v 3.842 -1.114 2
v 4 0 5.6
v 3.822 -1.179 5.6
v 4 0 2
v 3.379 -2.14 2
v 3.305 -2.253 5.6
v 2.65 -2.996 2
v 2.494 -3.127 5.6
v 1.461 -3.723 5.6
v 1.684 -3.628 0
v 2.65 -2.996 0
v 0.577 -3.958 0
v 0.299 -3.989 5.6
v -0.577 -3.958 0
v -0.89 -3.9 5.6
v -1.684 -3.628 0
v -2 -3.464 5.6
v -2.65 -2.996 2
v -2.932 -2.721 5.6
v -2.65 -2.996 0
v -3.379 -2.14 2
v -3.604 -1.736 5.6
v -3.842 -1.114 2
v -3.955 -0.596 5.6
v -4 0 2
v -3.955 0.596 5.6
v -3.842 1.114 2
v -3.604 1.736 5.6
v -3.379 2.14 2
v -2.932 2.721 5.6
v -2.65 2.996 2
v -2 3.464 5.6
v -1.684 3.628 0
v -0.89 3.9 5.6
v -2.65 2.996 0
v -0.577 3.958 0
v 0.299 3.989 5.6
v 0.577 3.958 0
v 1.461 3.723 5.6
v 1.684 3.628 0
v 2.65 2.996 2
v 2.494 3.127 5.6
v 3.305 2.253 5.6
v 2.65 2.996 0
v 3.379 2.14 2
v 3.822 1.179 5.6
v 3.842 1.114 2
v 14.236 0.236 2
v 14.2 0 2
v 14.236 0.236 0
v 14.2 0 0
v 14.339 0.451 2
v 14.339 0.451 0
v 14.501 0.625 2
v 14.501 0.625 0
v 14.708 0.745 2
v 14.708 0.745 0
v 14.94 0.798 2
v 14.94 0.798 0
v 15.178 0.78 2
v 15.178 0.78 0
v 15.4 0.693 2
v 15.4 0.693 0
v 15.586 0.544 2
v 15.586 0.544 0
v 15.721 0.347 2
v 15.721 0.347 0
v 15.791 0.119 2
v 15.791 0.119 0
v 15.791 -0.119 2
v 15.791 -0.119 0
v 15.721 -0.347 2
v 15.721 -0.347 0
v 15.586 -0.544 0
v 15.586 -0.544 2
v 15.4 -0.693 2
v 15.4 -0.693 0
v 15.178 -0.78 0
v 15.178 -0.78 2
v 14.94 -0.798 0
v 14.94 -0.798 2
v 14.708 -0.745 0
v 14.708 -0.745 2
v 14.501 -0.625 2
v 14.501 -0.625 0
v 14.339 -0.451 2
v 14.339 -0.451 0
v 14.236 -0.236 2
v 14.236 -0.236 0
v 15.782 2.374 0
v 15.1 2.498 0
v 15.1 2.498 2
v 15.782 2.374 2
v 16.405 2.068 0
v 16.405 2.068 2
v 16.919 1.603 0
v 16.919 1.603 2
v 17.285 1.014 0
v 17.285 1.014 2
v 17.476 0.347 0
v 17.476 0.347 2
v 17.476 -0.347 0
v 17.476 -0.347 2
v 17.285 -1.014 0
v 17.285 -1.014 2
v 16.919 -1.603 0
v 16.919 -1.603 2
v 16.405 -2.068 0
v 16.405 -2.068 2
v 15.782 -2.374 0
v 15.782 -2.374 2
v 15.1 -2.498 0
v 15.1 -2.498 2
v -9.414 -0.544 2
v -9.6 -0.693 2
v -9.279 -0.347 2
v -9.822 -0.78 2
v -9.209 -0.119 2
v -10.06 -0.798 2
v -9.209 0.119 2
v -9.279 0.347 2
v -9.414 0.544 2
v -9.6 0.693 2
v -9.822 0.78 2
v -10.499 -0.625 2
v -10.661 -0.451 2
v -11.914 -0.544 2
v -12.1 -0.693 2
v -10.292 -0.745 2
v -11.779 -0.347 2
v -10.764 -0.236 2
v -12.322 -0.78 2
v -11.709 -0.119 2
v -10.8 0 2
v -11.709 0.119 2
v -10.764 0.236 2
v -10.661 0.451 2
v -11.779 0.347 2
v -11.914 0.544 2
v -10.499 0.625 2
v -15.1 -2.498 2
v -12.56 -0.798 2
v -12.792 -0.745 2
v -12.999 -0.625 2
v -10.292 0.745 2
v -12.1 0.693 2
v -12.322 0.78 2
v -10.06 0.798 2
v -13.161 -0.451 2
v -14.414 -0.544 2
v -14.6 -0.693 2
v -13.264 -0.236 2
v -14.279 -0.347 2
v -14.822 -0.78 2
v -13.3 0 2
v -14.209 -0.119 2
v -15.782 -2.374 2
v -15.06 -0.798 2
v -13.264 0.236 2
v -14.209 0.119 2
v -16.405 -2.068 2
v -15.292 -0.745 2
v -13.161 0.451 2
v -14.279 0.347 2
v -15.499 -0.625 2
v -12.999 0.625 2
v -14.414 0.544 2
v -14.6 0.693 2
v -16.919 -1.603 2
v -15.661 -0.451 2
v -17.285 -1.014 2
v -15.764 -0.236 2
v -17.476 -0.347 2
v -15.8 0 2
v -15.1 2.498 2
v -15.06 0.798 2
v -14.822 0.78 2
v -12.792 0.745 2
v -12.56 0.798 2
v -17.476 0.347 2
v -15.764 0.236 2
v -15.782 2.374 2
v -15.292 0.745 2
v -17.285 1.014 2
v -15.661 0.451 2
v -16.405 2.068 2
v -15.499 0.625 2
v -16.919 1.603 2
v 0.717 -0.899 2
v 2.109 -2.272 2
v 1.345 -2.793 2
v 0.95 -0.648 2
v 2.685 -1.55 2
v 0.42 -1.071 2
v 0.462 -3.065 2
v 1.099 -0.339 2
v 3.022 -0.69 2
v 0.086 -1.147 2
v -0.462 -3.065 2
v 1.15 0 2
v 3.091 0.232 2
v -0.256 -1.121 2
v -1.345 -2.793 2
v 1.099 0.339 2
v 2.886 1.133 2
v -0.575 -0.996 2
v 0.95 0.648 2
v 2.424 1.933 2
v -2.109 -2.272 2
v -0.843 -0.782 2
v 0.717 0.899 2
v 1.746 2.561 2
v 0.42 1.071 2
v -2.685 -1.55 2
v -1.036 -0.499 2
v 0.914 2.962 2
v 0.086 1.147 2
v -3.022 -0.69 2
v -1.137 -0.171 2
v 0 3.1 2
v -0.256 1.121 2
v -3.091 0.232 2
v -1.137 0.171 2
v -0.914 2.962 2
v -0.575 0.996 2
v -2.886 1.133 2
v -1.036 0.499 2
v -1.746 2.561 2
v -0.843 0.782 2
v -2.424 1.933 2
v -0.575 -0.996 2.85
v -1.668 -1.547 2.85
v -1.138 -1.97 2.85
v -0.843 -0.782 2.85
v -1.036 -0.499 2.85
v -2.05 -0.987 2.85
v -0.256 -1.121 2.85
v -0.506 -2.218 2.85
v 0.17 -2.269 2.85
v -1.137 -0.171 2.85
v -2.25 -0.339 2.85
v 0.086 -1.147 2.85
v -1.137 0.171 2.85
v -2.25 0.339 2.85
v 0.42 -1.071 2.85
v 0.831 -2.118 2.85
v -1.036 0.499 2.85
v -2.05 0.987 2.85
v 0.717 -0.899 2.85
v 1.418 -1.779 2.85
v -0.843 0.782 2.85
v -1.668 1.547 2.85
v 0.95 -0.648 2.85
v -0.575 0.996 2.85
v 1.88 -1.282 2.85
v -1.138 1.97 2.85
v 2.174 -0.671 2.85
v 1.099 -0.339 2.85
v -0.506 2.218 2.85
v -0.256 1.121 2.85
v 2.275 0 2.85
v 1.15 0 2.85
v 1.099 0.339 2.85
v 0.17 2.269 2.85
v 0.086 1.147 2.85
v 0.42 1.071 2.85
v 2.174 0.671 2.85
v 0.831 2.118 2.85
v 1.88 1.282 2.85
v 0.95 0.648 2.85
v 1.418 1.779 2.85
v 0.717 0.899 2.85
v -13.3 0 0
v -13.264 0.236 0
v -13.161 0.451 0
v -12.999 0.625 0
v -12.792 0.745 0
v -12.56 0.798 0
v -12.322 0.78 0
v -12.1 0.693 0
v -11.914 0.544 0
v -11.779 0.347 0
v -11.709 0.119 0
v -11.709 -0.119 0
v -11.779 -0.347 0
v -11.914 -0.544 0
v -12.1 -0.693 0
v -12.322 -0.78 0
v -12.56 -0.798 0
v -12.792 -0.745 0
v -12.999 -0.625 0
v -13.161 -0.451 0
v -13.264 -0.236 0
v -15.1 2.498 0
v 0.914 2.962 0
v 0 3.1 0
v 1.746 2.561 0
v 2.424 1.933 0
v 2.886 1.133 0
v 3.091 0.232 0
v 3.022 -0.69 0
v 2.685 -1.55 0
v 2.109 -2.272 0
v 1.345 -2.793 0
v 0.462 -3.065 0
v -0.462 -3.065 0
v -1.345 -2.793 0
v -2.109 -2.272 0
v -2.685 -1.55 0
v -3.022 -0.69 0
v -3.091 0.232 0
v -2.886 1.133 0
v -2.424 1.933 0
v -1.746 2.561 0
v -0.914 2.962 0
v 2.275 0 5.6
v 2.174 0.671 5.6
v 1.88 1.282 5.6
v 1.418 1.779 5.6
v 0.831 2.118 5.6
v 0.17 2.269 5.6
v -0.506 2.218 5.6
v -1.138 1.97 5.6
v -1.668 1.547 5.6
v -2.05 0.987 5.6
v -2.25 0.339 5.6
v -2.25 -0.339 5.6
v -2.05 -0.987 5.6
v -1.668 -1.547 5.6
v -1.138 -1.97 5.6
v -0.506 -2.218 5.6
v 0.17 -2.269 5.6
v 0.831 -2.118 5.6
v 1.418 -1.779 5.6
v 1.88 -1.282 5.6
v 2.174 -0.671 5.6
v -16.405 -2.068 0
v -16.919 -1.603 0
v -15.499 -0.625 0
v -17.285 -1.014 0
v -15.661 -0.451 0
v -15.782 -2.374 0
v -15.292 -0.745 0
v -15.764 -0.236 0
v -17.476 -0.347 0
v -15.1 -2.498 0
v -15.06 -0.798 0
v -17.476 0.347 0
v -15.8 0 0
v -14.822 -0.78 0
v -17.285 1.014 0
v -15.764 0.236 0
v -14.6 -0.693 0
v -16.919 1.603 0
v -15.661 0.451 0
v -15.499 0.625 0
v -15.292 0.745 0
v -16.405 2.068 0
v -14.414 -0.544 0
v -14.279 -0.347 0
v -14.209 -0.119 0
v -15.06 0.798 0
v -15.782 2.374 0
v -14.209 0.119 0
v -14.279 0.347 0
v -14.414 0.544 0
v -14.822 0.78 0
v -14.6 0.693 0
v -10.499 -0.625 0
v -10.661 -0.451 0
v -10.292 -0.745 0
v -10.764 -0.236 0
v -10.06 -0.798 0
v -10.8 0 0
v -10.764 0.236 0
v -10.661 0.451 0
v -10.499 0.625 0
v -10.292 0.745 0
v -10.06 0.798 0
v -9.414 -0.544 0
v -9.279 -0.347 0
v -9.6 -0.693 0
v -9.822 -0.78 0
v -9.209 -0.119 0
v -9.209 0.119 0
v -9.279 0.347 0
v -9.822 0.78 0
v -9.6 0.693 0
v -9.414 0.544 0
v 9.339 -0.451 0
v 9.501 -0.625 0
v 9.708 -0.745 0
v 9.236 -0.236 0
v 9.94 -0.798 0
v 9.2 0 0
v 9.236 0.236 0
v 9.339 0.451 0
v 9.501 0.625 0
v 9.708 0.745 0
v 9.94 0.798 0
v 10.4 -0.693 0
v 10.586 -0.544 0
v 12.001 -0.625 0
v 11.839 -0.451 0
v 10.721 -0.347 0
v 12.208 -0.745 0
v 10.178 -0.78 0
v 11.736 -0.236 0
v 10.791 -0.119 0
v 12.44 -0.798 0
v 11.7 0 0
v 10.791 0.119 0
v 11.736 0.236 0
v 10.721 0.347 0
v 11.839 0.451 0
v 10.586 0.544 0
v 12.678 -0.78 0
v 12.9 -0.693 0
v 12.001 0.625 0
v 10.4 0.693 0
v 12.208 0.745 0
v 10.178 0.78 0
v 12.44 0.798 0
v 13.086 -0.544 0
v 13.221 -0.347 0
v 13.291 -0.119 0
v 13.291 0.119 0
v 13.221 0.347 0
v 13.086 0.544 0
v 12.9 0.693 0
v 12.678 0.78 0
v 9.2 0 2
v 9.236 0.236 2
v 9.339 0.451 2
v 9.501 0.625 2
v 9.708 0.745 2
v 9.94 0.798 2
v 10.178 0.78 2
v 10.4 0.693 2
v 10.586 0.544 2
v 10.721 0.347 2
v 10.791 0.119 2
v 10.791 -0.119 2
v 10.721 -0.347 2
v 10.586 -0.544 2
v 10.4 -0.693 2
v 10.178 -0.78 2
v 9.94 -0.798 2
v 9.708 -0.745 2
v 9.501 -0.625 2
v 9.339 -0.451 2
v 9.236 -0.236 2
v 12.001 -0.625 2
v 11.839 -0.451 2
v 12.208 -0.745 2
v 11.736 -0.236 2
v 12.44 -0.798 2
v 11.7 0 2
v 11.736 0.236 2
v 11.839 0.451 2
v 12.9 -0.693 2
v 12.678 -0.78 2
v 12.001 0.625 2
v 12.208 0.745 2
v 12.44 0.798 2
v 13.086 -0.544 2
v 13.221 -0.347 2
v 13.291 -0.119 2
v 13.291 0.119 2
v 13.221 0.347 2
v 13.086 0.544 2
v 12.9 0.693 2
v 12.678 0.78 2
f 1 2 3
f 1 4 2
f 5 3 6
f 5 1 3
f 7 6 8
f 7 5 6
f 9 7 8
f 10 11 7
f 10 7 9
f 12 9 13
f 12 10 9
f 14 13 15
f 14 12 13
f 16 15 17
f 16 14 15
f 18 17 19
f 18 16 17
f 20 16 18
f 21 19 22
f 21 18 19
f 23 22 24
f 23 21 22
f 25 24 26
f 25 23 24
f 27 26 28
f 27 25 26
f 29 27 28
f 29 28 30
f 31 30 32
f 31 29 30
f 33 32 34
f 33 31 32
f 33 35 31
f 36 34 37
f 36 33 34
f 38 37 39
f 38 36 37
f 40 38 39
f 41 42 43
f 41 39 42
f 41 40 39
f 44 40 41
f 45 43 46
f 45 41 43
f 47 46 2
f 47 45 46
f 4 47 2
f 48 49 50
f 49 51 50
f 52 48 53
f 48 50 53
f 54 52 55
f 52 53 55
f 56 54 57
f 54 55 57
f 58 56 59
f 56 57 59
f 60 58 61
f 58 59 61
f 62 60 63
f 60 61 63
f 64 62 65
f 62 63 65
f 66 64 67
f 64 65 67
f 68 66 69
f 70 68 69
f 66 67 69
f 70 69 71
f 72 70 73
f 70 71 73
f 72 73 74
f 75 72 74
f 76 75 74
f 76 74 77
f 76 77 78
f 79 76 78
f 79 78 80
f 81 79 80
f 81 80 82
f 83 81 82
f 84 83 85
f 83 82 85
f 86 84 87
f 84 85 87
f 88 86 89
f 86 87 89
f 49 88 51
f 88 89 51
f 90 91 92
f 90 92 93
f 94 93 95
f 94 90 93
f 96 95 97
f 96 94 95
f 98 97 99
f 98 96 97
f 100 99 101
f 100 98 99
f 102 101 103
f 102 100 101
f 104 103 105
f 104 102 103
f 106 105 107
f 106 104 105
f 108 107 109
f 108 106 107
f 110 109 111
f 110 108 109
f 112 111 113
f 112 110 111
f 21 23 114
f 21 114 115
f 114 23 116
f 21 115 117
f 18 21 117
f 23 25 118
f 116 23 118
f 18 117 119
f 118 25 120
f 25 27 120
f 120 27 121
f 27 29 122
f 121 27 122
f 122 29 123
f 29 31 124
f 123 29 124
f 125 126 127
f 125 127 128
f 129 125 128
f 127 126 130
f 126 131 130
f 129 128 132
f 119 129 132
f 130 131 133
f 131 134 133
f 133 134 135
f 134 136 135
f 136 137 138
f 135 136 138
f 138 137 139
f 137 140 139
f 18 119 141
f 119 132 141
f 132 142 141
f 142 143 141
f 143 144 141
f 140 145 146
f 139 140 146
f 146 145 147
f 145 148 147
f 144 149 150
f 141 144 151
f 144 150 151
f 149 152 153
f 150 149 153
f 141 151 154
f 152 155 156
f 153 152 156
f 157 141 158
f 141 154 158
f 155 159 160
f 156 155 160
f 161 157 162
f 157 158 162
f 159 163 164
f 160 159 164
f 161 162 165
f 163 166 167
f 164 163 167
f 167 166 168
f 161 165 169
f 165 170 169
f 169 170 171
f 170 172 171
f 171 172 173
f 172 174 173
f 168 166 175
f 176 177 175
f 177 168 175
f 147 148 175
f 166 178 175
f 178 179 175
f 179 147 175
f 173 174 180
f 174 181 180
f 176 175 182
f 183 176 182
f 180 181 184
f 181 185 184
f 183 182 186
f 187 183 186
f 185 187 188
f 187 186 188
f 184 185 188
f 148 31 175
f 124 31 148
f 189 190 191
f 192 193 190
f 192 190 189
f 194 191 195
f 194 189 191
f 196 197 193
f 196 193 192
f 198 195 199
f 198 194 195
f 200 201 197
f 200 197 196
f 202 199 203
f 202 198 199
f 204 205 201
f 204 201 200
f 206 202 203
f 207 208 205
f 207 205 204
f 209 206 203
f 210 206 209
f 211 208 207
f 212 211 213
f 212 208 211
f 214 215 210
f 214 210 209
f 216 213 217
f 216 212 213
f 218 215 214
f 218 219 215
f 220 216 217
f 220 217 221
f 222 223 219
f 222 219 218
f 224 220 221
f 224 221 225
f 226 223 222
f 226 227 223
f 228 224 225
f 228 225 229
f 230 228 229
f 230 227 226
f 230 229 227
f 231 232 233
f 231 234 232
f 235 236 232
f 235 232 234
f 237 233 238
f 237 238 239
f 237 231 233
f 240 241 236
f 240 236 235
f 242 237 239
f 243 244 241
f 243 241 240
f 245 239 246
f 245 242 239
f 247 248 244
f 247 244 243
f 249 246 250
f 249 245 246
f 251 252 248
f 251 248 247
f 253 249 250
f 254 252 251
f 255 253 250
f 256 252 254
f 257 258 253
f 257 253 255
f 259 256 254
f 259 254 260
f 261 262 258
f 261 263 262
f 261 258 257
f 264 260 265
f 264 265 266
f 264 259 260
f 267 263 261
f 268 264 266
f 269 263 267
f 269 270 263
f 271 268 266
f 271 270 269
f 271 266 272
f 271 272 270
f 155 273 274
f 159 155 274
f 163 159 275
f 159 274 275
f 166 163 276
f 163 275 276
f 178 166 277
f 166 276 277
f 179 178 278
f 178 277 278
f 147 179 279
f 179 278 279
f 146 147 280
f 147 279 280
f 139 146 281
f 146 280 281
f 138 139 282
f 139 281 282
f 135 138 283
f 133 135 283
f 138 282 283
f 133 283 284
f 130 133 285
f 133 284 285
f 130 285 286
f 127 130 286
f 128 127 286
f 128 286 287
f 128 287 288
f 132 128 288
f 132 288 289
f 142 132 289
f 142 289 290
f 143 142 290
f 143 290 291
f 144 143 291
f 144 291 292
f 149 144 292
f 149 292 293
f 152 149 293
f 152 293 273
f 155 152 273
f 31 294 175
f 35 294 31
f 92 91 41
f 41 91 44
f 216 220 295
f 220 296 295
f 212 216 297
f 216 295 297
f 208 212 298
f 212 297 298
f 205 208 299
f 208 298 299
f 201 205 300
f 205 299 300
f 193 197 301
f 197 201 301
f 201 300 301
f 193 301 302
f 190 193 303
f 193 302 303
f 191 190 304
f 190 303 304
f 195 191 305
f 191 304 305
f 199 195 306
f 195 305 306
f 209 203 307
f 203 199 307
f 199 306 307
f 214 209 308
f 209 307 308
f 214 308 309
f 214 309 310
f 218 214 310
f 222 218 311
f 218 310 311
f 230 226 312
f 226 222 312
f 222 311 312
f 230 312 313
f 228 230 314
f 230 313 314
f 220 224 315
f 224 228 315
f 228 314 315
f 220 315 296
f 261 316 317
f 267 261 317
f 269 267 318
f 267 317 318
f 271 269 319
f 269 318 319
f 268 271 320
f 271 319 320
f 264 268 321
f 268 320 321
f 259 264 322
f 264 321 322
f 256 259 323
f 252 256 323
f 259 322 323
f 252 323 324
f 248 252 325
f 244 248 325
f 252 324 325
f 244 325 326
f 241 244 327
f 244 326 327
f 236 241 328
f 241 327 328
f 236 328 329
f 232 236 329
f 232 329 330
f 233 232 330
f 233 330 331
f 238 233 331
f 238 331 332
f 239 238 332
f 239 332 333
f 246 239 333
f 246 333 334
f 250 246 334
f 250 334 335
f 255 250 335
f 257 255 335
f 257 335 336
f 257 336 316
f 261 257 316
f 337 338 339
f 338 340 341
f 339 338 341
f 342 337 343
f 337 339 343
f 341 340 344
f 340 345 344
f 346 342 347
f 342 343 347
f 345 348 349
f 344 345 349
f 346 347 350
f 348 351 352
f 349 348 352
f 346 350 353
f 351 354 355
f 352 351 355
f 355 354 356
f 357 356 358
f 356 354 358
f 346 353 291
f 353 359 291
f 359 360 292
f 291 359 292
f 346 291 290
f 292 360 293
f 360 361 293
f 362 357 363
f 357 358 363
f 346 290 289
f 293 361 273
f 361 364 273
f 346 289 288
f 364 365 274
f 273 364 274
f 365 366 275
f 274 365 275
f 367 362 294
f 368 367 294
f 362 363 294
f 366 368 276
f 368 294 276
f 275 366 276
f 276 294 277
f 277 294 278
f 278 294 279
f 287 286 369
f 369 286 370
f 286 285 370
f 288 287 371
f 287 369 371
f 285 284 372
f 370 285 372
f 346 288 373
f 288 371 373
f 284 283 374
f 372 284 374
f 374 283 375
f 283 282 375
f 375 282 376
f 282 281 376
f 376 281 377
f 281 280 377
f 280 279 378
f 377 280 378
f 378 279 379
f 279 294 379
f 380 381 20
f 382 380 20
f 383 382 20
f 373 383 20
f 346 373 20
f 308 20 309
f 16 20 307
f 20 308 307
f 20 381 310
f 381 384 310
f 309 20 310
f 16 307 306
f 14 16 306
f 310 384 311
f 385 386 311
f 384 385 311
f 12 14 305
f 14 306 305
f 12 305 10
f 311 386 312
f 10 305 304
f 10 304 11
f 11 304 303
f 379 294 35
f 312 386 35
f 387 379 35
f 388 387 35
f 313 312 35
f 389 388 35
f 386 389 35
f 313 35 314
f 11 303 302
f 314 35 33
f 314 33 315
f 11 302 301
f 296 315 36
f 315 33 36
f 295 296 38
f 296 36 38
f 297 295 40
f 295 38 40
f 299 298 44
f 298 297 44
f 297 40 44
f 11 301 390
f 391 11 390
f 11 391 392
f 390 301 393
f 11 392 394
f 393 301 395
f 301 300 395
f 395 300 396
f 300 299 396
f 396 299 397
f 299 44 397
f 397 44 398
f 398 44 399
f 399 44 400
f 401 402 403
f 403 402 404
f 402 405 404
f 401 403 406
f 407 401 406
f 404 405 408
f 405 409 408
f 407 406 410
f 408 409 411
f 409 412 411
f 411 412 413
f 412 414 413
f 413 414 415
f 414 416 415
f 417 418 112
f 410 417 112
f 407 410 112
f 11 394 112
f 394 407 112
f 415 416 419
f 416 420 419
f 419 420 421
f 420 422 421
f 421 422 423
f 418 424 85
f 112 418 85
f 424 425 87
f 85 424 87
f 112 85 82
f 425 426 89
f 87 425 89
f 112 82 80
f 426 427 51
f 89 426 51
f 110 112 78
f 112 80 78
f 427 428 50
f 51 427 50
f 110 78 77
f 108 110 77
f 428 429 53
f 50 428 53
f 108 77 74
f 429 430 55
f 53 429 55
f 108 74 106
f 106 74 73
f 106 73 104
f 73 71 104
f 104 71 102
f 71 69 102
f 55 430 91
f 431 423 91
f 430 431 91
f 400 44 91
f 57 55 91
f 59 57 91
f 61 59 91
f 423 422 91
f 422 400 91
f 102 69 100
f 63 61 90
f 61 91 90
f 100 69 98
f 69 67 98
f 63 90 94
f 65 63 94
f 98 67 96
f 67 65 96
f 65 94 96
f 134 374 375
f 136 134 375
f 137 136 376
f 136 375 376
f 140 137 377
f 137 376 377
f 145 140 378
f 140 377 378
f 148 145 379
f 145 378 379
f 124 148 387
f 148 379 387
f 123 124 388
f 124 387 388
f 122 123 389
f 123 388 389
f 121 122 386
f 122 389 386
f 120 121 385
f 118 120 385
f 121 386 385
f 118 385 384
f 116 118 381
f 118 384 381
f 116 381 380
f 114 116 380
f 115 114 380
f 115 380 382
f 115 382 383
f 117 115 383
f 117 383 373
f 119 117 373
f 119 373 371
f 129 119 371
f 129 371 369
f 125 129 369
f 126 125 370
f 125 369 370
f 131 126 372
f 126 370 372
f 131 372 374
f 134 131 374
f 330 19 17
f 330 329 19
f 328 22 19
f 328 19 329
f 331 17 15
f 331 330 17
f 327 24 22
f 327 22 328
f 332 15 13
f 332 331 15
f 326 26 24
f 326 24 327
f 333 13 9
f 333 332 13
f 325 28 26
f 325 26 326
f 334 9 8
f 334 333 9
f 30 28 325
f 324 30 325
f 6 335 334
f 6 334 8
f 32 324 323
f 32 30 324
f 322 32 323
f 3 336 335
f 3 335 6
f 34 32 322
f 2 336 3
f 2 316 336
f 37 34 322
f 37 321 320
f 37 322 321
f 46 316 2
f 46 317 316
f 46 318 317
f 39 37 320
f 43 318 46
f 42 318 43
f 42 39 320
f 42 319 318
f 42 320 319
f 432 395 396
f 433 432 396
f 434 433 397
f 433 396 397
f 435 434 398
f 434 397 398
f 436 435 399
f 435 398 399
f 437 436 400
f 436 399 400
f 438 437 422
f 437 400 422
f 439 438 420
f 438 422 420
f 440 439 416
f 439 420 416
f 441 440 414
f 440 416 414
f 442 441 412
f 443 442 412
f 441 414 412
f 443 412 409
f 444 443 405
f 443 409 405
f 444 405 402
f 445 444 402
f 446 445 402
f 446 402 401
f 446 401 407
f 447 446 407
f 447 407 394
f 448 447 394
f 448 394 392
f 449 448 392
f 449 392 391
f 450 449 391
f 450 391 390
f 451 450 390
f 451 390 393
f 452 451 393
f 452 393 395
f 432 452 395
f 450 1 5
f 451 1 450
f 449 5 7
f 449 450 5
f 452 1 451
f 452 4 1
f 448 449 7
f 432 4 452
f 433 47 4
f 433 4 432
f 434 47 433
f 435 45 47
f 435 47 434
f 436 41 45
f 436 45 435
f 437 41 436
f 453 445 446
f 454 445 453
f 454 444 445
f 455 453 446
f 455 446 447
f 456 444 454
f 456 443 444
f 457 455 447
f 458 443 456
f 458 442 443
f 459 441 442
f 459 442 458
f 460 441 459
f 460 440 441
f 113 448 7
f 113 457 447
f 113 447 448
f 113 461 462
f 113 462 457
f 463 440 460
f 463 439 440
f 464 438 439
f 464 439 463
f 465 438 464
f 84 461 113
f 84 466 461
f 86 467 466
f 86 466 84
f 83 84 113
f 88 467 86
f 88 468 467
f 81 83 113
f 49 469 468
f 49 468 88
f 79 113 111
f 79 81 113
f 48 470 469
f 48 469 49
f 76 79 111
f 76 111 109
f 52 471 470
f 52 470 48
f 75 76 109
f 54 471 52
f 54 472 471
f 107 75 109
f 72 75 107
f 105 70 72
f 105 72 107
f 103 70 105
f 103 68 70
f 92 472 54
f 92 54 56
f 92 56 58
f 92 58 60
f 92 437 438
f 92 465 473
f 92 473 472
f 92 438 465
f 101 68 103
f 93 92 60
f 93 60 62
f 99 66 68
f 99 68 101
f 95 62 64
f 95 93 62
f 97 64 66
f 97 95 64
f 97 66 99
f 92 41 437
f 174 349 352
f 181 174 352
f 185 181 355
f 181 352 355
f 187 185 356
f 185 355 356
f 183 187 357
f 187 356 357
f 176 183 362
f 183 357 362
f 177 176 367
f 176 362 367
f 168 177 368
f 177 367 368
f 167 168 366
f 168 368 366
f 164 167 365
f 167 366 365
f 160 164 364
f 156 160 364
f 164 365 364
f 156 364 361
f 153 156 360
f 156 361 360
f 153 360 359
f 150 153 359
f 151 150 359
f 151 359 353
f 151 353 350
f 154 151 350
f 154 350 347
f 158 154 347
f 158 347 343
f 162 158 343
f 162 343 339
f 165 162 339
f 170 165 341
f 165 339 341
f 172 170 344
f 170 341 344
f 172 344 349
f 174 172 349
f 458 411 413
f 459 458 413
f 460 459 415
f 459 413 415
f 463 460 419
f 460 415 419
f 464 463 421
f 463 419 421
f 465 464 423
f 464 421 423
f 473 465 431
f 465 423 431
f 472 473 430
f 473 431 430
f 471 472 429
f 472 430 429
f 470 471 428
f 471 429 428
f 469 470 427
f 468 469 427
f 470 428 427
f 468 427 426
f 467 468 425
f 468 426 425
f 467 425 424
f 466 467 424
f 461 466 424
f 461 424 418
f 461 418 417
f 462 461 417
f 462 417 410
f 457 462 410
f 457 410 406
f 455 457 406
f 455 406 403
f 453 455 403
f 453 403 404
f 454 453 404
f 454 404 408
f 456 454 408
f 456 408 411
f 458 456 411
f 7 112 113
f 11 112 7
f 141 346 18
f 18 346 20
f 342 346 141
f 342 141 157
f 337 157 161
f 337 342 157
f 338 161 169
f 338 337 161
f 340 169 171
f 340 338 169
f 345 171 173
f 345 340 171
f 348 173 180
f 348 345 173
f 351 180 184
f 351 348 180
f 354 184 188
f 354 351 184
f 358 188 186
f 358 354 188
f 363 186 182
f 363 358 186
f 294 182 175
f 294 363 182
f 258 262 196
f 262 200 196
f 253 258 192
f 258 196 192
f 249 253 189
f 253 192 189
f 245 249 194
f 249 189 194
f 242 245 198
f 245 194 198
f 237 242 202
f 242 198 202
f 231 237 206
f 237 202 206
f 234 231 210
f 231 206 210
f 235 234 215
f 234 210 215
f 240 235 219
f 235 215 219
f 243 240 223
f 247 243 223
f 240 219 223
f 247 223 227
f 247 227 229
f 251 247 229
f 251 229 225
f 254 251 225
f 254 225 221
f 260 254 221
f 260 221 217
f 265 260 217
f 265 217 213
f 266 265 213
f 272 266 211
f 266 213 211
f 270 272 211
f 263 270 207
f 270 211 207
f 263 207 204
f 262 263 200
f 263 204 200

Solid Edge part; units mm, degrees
sketch "Sketch1" plane through (0, 0, 0) normal (0, 0, 1) x (1, 0, 0)
  circle A0 centre (0, 0) radius 4
  circle A1 centre (0, 0) radius 1.15
  dimension "D1" = 2.3
extrude "Protrusion1" add sketch "Sketch1" along normal blind 5.6
sketch "Sketch2" plane through (0, 0, 5.6) normal (0, 0, 1) x (1, 0, 0)
  circle A0 centre (0, 0) radius 2.275
  dimension "D1" = 4.55
extrude "ExtrudedCutout_1" cut sketch "Sketch2" against normal blind 2.75
sketch "Sketch3" plane through (0, 0, 0) normal (0, 0, -1) x (0, 1, 0)
  circle A0 centre (0, 0) radius 3.1
  dimension "D1" = 6.2
extrude "ExtrudedCutout_2" cut sketch "Sketch3" against normal blind 2
sketch "Sketch4" plane through (0, 0, 0) normal (0, 0, -1) x (-1, 0, 0)
  circle A0 centre (-10, 0) radius 0.8
  circle A1 centre (10, 0) radius 0.8
  circle A2 centre (12.5, 0) radius 0.8
  circle A3 centre (15, 0) radius 0.8
  circle A4 centre (-12.5, 0) radius 0.8
  circle A5 centre (-15, 0) radius 0.8
  line L0 (-15.1, 2.498) -> (-0.124, 3.0975)
  arc A6 (-0.124, 3.0975) -> (-0.124, -3.0975) centre (0, 0) ccw
  line L1 (-15.1, -2.498) -> (-0.124, -3.0975)
  arc A7 (-15.1, -2.498) -> (-15.1, 2.498) centre (-15, 0) cw
  line L2 (15.1, 2.498) -> (0.124, 3.0975)
  arc A8 (0.124, -3.0975) -> (0.124, 3.0975) centre (0, 0) ccw
  line L3 (15.1, -2.498) -> (0.124, -3.0975)
  arc A9 (15.1, -2.498) -> (15.1, 2.498) centre (15, 0) ccw
extrude "ExtrudedProtrusion_2" add sketch "Sketch4" against normal blind 2
